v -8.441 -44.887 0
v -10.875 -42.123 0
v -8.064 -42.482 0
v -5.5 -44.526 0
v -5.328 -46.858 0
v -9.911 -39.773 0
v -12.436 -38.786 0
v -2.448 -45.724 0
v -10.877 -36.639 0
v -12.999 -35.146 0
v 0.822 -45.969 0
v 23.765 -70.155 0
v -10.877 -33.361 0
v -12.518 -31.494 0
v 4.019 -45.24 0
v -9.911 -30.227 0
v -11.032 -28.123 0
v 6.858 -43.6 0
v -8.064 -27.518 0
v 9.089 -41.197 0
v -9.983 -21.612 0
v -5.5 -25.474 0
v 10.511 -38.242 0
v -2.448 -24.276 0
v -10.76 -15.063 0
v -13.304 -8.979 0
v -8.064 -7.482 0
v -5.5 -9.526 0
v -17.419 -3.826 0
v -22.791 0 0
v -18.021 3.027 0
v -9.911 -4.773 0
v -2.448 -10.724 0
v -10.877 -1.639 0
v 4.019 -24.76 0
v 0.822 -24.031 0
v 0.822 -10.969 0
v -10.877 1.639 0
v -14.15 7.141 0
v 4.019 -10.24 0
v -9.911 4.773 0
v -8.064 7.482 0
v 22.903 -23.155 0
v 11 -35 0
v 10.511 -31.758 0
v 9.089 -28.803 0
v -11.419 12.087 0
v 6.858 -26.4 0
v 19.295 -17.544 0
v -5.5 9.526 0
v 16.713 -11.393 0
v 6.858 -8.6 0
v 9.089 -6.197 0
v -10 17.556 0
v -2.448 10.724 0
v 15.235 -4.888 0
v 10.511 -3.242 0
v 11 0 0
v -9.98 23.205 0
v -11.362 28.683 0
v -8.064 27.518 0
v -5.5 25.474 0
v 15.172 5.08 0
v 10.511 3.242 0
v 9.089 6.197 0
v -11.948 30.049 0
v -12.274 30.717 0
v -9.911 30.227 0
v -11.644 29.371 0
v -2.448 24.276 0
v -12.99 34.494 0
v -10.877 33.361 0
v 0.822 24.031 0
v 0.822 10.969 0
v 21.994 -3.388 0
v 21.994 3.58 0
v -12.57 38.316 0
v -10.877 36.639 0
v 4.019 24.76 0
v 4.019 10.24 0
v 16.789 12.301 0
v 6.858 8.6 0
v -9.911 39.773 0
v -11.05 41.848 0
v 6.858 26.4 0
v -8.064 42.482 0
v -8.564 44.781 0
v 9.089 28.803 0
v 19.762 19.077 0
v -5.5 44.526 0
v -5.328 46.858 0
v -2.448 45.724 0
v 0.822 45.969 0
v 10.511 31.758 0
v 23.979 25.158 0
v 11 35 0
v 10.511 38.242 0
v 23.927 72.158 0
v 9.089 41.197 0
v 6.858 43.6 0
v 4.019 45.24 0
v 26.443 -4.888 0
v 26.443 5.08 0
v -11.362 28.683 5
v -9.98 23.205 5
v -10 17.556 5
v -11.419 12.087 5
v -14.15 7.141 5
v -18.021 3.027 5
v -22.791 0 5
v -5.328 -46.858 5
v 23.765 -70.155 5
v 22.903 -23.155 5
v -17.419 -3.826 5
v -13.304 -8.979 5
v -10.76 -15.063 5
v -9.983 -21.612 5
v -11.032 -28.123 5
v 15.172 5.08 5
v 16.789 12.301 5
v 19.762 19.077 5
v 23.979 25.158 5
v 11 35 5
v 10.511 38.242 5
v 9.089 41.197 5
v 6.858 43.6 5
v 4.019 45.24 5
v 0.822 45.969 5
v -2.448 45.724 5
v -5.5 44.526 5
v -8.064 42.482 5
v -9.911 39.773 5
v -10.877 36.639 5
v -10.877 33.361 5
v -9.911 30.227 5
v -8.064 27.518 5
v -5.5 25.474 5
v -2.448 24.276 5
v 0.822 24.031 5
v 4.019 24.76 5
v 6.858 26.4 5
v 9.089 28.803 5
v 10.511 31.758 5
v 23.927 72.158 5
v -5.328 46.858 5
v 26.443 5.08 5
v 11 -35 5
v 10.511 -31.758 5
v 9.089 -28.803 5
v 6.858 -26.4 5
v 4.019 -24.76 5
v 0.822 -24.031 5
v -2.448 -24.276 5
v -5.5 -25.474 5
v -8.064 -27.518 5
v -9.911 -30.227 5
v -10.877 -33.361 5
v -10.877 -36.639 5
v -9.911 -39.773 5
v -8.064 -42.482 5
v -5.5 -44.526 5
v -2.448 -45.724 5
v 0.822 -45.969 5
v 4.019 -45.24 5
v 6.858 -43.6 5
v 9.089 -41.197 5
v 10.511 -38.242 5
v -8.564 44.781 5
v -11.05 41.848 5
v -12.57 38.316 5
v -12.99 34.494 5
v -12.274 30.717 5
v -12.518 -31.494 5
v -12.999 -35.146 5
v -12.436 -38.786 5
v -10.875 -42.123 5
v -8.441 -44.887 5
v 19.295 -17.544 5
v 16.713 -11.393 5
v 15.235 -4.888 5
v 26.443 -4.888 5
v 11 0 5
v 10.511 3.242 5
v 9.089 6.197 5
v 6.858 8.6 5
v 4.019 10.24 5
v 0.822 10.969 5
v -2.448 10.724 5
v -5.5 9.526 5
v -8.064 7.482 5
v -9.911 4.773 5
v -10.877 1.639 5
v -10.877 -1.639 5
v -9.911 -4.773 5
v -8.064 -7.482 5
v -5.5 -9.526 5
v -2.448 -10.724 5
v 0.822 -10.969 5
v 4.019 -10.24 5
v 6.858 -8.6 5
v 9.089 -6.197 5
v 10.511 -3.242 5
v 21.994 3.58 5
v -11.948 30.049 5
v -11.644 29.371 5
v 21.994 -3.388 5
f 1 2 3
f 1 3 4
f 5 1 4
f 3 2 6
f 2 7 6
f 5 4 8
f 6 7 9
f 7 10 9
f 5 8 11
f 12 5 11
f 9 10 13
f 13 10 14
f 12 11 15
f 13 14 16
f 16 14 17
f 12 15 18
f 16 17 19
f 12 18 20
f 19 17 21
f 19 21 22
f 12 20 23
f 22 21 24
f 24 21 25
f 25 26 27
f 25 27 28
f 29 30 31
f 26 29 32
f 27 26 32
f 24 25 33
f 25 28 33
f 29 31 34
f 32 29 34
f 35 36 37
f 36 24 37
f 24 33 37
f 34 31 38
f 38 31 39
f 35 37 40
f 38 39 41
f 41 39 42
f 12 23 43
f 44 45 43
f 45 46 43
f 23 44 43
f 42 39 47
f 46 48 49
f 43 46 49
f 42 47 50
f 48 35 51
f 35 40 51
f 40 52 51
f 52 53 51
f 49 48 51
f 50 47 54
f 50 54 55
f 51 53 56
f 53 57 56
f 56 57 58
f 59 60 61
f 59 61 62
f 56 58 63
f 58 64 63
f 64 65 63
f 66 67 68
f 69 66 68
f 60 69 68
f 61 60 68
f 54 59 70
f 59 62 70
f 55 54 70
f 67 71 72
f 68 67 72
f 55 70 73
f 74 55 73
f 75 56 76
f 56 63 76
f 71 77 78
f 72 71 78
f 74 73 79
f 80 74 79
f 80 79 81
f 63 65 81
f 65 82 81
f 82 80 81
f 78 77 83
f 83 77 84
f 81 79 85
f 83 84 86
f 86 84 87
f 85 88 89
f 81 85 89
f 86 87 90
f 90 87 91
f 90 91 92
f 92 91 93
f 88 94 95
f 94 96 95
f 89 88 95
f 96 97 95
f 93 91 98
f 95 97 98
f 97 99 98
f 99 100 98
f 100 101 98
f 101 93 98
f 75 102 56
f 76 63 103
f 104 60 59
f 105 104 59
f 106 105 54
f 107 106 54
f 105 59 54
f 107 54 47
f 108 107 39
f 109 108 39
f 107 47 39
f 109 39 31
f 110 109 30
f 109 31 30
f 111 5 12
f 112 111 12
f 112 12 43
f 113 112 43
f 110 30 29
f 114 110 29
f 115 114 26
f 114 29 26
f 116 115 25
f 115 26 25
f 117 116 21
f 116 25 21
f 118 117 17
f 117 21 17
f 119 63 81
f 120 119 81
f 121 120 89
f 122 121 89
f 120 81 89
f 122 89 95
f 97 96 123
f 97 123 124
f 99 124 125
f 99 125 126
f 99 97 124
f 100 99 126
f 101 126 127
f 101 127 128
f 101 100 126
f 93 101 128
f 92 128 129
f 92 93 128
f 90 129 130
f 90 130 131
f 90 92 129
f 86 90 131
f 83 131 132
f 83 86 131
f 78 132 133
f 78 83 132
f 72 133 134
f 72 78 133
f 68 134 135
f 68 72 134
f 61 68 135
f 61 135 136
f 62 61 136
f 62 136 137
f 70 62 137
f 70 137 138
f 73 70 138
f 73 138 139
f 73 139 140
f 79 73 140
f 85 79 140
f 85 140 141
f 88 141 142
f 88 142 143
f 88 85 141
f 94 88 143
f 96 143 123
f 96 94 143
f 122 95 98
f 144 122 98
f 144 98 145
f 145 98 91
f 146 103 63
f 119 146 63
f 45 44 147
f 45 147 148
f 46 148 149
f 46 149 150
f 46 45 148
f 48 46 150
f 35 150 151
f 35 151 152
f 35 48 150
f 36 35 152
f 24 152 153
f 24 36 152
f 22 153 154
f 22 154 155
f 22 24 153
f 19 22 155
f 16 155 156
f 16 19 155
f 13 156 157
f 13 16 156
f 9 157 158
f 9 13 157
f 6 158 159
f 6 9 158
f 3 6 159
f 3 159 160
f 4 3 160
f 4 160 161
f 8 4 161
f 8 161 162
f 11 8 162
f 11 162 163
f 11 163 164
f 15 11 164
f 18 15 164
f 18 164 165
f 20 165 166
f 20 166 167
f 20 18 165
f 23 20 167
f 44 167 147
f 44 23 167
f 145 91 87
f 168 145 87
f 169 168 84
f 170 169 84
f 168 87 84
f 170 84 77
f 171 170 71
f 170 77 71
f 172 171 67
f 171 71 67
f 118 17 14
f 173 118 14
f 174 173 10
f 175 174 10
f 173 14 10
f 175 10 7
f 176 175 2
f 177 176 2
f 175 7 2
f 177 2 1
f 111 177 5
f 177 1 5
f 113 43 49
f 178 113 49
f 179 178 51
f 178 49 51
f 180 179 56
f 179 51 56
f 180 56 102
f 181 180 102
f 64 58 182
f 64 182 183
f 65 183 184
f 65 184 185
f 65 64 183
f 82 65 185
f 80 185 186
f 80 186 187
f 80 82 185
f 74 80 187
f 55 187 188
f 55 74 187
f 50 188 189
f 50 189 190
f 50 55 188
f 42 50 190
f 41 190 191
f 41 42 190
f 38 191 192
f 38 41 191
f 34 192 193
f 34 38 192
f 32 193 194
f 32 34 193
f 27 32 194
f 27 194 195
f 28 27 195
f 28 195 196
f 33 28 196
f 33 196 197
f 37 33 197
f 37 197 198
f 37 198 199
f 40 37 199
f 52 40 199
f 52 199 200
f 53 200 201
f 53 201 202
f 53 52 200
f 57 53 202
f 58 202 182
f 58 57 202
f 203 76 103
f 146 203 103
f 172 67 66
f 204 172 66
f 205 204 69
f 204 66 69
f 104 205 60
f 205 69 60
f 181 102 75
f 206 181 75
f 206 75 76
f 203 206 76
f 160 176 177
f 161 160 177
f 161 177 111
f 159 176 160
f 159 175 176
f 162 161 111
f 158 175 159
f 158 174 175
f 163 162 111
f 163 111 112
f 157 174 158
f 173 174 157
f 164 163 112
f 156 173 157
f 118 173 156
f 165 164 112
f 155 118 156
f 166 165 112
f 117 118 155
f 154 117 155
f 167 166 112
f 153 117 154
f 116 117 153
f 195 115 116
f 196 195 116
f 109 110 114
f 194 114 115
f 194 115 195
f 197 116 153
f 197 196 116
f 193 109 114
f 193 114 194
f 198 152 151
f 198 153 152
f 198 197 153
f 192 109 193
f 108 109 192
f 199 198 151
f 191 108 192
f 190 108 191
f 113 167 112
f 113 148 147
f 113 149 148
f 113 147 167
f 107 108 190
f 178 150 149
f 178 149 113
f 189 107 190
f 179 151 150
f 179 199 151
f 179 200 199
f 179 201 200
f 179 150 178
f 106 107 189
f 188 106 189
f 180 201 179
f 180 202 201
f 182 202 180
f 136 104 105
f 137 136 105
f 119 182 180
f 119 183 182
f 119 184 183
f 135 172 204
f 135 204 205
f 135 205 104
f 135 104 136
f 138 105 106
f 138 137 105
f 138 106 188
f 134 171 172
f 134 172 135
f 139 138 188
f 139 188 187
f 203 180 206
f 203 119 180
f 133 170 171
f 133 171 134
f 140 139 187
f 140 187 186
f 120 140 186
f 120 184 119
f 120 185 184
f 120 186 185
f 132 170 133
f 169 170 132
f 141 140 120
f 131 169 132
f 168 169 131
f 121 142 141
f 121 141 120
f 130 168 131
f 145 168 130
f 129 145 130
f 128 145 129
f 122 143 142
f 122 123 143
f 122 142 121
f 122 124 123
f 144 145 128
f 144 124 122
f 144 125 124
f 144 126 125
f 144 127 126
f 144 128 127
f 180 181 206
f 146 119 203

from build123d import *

# Parameters (mm, degrees)
F0_R     = 11
F1_DEPTH = 5


with BuildPart() as f1:
    # F0 (on Top) → F1 (new body)
    with BuildSketch(Plane.XY):
        with BuildLine():
            ThreePointArc((-5.328375, 46.857842), (7.061555, 45.914872), (13, 35))
            ThreePointArc((13, 35), (3.263036, 22.416177), (-11.361938, 28.682851))
            ThreePointArc((-11.361938, 28.682851), (-11.419195, 12.087231), (-22.790948, 0))
            ThreePointArc((-22.790948, 0), (-11.819872, -11.932631), (-11.032154, -28.123112))
            ThreePointArc((-11.032154, -28.123112), (3.576451, -22.50164), (13, -35))
            ThreePointArc((13, -35), (7.061555, -45.914872), (-5.328375, -46.857842))
            Line((-5.328375, -46.857842), (23.764569, -70.154617))
            Line((23.764569, -70.154617), (22.902545, -23.154617))
            ThreePointArc((22.902545, -23.154617), (17.870455, -14.524343), (15.235059, -4.888045))
            Line((15.235059, -4.888045), (26.443267, -4.888045))
            Line((26.443267, -4.888045), (21.993627, -3.388045))
            Line((21.993627, -3.388045), (21.993627, 3.58024))
            Line((21.993627, 3.58024), (26.443267, 5.08024))
            Line((26.443267, 5.08024), (15.172052, 5.08024))
            ThreePointArc((15.172052, 5.08024), (18.112091, 15.760837), (23.979004, 25.157556))
            Line((23.979004, 25.157556), (23.926978, 72.157556))
            Line((23.926978, 72.157556), (-5.328375, 46.857842))
        make_face()
        Circle(F0_R, mode=Mode.SUBTRACT)
        with BuildLine():
            ThreePointArc((-11.361938, 28.682851), (3.263036, 22.416177), (13, 35))
            ThreePointArc((13, 35), (7.061555, 45.914872), (-5.328375, 46.857842))
            ThreePointArc((-5.328375, 46.857842), (-11.941319, 40.13857), (-12.274144, 30.716847))
            ThreePointArc((-12.274144, 30.716847), (-11.792962, 29.711097), (-11.361938, 28.682851))
        make_face()
        with Locations((0, 35)):
            Circle(F0_R, mode=Mode.SUBTRACT)
        with BuildLine():
            ThreePointArc((13, -35), (3.576451, -22.50164), (-11.032154, -28.123112))
            ThreePointArc((-11.032154, -28.123112), (-12.436408, -38.786258), (-5.328375, -46.857842))
            ThreePointArc((-5.328375, -46.857842), (7.061555, -45.914872), (13, -35))
        make_face()
        with Locations((0, -35)):
            Circle(F0_R, mode=Mode.SUBTRACT)
    extrude(amount=F1_DEPTH)


solid = f1.part
